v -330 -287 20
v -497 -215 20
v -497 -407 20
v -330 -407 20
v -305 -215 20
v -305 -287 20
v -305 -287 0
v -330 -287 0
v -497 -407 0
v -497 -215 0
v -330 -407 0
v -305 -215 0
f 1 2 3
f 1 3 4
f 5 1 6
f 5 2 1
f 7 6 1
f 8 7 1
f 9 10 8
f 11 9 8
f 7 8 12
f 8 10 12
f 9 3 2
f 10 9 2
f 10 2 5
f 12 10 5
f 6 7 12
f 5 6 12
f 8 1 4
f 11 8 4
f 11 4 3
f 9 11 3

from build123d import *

# Parameters (mm, degrees)
F2_DEPTH  = 20
F3_W      = 217
F3_H      = 242
F3_W_2    = 167
F3_H_2    = 192
F4_DEPTH  = 240
F5_W      = 48
F5_H      = 72
F6_DEPTH  = 250
F7_W      = 79
F7_H      = 85
F8_DEPTH  = 25
F10_DEPTH = 25
F12_DEPTH = 240.001


with BuildPart() as f2:
    # F1 (on face) → F2 (new body)
    with BuildSketch(Plane.XY):
        Polygon((-497, -215), (-497, -231), (-497, -293), (-497, -407), (-330, -407), (-330, -287), (-330, -215), align=None)
    extrude(amount=F2_DEPTH)

    # F3 (on face) → F4 (join)
    with BuildSketch(Plane.XY):
        with Locations((-413.5, -311)):
            Rectangle(F3_W, F3_H)
        with Locations((-413.5, -311)):
            Rectangle(F3_W_2, F3_H_2, mode=Mode.SUBTRACT)
    extrude(amount=F4_DEPTH)

    # F5 (on face) → F6 (cut)
    with BuildSketch(Plane.XY.offset(20)):
        with Locations((-306, -251)):
            Rectangle(F5_W, F5_H)
    extrude(amount=F6_DEPTH, mode=Mode.SUBTRACT)

    # F7 (on face) → F8 (cut)
    with BuildSketch(Plane.YZ.offset(-497)):
        with Locations((-309.5, 177.5)):
            Rectangle(F7_W, F7_H)
    extrude(amount=-F8_DEPTH, mode=Mode.SUBTRACT)

    # F9 (on face) → F10 (join, through all)
    with BuildSketch(Plane.YZ.offset(-497)):
        Polygon((-270, 135), (-270, 220), (-290, 220), (-290, 155), (-349, 155), (-349, 135), align=None)
    extrude(amount=-F10_DEPTH)

    # F11 (on face) → F12 (cut, through all)
    with BuildSketch(Plane.XY.offset(240)):
        Polygon((-497, -407), (-497, -215), (-305, -215), (-305, -190), (-522, -190), (-522, -432), (-305, -432), (-305, -287), (-330, -287), (-330, -407), align=None)
    extrude(amount=-F12_DEPTH, mode=Mode.SUBTRACT)


solid = f2.part
